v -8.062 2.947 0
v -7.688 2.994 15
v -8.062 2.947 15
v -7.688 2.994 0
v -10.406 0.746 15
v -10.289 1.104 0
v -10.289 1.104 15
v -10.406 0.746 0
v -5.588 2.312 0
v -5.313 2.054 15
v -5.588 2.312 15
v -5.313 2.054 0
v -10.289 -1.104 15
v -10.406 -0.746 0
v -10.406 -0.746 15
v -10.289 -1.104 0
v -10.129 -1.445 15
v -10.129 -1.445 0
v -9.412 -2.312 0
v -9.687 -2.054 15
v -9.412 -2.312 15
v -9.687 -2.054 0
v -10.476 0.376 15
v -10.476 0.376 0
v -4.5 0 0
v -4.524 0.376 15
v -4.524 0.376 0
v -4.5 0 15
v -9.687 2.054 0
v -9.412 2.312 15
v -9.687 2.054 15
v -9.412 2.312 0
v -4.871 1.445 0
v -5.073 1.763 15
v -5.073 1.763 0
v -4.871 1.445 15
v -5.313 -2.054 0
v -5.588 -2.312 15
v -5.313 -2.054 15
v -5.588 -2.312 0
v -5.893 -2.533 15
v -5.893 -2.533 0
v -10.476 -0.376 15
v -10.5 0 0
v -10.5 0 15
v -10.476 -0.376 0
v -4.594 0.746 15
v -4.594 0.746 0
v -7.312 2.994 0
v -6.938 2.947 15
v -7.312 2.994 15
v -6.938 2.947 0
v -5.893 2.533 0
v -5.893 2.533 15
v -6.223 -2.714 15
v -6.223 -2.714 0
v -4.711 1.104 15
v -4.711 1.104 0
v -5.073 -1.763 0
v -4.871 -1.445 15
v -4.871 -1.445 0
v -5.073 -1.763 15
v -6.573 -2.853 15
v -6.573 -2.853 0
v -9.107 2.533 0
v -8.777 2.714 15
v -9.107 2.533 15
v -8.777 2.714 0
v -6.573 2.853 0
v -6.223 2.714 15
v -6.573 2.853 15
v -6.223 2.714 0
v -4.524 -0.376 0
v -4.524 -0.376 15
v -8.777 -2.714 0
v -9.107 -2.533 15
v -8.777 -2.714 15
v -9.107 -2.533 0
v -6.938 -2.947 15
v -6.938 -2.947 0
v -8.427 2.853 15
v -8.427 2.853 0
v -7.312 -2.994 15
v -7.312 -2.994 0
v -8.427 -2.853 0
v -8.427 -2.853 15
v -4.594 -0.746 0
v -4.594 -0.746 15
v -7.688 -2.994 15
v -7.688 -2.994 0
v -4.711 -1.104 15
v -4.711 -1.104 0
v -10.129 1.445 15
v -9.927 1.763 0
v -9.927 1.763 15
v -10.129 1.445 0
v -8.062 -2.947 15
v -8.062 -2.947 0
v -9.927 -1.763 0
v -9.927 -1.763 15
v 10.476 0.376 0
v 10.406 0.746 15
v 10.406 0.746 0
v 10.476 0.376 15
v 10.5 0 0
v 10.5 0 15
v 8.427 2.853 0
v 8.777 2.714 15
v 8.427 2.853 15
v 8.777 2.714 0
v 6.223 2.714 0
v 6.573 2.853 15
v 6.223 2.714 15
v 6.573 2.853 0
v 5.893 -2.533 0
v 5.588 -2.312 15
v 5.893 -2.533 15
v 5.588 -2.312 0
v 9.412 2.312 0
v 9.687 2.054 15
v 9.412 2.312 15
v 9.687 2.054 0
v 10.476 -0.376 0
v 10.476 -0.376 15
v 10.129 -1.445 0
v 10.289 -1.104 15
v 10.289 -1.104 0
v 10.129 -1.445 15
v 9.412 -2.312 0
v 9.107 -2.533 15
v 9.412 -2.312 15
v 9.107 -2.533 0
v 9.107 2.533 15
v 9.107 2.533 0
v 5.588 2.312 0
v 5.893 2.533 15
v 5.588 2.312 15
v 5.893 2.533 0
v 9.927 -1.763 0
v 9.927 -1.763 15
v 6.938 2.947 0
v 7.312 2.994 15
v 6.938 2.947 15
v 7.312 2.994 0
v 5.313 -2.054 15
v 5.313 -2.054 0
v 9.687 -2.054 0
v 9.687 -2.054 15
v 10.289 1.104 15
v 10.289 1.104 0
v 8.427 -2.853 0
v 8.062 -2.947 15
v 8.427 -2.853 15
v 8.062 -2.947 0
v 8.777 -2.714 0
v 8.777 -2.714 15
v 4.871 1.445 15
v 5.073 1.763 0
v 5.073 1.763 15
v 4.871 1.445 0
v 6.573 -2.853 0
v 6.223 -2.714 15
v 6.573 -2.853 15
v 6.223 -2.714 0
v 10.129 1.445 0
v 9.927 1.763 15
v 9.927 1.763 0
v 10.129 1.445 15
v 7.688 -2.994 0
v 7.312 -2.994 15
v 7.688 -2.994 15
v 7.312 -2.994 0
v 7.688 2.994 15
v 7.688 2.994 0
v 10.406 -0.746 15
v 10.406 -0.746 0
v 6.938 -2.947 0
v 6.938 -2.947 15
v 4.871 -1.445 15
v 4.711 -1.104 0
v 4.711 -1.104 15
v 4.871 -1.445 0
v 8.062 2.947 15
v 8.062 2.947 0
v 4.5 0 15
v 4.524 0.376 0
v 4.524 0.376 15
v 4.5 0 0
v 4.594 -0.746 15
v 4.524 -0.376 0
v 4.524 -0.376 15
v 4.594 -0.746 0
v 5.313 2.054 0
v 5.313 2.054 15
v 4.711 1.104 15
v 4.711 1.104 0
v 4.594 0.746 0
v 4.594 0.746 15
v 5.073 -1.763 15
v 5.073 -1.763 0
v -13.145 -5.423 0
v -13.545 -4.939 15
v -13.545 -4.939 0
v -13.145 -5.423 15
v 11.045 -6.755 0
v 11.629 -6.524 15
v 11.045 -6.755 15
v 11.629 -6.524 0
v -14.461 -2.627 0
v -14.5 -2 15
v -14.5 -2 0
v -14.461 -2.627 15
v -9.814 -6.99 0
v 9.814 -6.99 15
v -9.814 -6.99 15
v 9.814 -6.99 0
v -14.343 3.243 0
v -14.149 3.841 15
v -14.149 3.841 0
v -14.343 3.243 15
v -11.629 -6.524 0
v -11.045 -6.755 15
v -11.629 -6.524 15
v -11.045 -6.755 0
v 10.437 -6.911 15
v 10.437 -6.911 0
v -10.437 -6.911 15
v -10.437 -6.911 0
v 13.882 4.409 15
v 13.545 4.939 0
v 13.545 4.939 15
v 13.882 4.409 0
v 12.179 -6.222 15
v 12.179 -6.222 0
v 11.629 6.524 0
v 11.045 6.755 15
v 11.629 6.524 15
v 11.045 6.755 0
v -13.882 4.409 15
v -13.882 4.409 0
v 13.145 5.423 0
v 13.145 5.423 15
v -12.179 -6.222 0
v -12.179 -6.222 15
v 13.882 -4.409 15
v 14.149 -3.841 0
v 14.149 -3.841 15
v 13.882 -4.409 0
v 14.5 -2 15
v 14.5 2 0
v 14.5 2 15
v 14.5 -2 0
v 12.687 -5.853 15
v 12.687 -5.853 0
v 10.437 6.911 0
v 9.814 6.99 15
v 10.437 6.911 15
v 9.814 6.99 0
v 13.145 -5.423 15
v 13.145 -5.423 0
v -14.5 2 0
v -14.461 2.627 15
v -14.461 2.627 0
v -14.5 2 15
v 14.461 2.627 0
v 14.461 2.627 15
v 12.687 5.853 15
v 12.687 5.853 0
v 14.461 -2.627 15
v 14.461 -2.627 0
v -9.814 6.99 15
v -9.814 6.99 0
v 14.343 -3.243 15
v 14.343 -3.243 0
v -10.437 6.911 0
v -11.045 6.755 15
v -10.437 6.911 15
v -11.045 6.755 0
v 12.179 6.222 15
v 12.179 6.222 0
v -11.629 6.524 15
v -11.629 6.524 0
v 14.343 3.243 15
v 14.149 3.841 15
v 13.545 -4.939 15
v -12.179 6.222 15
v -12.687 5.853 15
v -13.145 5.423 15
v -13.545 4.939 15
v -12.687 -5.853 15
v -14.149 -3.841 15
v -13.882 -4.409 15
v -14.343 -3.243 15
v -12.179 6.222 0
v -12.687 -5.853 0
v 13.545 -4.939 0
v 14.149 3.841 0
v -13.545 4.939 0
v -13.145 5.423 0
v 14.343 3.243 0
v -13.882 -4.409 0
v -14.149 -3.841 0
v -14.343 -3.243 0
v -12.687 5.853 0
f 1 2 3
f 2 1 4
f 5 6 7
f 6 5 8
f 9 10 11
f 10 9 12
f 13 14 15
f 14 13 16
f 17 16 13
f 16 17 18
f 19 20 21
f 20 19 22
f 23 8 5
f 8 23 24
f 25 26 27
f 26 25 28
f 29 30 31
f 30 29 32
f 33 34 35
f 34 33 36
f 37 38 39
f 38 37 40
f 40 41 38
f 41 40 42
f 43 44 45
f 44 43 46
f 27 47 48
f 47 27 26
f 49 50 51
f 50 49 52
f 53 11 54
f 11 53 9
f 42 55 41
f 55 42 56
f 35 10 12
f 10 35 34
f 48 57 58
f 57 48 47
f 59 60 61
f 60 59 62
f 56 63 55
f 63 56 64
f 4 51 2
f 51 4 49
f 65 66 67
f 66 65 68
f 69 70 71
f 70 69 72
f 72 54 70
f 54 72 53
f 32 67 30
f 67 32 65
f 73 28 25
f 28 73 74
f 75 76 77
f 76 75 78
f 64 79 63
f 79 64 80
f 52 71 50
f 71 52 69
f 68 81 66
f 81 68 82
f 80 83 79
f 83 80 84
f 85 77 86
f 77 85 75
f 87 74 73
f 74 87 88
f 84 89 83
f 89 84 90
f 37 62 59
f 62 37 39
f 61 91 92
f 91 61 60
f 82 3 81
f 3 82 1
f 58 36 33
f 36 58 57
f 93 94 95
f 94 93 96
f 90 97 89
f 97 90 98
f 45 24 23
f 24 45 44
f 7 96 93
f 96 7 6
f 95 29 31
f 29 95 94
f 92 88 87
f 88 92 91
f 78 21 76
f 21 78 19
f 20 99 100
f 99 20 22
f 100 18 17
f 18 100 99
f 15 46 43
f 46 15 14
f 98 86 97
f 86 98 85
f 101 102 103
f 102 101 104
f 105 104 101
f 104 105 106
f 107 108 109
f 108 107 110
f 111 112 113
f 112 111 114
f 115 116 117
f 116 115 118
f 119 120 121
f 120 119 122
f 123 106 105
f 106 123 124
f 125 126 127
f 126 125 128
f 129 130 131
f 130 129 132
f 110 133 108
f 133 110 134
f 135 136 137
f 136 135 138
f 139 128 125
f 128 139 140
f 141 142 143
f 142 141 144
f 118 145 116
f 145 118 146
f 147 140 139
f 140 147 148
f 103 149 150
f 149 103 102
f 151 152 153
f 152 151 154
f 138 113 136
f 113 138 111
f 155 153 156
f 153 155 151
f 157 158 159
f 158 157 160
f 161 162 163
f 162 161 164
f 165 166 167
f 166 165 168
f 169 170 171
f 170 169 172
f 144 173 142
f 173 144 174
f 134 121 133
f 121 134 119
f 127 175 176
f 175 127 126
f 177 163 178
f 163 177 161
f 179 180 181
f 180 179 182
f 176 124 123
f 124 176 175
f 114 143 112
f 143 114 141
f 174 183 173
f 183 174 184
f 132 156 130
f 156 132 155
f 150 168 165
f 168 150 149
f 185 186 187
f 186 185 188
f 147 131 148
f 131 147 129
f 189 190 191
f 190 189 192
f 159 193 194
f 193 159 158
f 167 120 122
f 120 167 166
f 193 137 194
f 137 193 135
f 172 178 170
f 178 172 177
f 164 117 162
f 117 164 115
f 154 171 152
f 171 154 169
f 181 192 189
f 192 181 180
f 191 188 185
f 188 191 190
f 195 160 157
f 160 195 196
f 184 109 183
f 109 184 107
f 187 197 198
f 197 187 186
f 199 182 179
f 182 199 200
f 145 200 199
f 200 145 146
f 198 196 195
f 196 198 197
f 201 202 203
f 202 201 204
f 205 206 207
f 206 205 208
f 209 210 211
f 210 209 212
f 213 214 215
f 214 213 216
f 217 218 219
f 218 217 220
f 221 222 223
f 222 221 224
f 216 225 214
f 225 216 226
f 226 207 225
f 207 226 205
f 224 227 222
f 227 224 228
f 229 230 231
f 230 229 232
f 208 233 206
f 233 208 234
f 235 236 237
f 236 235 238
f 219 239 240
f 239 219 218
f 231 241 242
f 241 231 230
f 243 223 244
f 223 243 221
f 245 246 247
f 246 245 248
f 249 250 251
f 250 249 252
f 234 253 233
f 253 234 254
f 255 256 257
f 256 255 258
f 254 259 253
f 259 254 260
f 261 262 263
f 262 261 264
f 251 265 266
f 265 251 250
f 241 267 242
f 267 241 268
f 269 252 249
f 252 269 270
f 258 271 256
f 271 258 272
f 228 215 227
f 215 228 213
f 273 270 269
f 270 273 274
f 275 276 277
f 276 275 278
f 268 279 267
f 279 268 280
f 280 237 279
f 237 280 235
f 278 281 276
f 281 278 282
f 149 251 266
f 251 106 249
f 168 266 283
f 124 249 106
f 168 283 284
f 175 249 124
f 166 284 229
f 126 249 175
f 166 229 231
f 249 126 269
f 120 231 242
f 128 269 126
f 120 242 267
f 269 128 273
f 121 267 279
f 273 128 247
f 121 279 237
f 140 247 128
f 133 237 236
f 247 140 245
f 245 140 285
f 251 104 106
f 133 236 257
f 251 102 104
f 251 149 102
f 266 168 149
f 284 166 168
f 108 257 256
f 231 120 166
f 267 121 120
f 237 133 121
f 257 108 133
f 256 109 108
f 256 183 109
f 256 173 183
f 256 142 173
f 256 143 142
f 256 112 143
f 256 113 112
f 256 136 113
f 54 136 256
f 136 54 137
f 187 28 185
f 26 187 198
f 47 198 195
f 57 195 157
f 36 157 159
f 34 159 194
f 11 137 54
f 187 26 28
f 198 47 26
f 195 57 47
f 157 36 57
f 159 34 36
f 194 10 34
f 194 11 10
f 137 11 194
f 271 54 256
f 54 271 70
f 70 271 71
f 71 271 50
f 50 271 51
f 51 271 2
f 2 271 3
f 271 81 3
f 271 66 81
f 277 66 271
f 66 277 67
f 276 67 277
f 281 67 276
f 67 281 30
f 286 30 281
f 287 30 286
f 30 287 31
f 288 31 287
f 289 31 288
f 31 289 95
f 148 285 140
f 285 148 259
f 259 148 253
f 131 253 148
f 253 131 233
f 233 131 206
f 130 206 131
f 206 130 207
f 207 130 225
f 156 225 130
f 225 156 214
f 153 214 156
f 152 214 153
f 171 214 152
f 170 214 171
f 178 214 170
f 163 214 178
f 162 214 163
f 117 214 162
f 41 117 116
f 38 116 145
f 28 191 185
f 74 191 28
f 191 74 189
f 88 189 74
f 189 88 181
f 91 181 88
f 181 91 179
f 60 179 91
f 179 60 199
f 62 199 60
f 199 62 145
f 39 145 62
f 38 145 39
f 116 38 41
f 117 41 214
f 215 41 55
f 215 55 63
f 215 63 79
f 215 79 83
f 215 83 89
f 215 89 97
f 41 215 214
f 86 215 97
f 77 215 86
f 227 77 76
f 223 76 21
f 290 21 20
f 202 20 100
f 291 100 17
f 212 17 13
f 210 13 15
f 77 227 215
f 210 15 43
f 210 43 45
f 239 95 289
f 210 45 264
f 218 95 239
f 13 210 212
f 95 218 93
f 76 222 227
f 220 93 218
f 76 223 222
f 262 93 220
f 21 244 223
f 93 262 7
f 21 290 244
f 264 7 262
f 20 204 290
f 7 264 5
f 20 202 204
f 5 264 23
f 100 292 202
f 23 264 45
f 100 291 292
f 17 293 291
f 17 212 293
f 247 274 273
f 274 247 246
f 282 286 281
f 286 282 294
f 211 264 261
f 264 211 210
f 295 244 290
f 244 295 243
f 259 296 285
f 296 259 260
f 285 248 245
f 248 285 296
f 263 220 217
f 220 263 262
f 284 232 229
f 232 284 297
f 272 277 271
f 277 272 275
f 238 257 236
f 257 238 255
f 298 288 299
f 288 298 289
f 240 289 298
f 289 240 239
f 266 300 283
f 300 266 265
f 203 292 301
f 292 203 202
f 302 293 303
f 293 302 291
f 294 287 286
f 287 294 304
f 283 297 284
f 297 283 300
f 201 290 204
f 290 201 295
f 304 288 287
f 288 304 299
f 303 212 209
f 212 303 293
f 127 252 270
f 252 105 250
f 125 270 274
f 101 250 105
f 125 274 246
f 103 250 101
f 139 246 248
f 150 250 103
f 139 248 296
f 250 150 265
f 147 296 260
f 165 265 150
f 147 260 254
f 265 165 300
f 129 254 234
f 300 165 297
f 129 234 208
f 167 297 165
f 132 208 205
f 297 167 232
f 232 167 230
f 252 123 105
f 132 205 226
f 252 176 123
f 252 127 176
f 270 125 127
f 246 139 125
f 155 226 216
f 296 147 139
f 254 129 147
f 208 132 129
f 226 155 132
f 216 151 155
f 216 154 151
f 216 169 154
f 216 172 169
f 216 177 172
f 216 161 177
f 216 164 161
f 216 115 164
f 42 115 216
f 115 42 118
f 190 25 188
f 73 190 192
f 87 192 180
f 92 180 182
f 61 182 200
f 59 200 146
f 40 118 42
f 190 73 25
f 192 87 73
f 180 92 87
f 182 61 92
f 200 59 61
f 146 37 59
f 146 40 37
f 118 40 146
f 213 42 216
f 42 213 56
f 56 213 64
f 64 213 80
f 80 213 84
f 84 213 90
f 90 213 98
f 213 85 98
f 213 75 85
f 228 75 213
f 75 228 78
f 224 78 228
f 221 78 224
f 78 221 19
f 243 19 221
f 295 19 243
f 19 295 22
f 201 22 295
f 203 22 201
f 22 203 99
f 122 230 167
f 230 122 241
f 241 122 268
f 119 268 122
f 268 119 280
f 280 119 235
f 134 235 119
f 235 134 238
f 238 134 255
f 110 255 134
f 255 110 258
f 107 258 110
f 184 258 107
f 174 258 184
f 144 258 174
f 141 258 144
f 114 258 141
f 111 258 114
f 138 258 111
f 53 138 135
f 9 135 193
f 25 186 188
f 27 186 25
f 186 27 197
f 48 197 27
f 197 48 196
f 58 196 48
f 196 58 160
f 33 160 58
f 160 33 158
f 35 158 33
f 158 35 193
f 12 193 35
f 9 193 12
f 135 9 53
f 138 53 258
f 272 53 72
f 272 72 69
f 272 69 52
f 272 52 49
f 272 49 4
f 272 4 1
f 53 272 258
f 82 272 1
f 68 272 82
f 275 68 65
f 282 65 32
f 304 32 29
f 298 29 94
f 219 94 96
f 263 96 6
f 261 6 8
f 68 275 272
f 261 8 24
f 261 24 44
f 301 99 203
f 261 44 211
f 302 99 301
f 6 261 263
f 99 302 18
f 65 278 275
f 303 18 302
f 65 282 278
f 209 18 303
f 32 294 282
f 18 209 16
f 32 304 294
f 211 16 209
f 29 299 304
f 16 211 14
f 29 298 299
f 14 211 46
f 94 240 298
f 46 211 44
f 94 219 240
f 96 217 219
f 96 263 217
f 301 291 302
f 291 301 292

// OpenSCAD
$fn = 50;


difference() {
	union() {
		hull() {
			translate(v = [-9.5000000000, 2.0000000000, 0]) {
				cylinder(h = 15, r = 5);
			}
			translate(v = [9.5000000000, 2.0000000000, 0]) {
				cylinder(h = 15, r = 5);
			}
			translate(v = [-9.5000000000, -2.0000000000, 0]) {
				cylinder(h = 15, r = 5);
			}
			translate(v = [9.5000000000, -2.0000000000, 0]) {
				cylinder(h = 15, r = 5);
			}
		}
	}
	union() {
		translate(v = [-7.5000000000, 0.0000000000, 0]) {
			translate(v = [0, 0, -100]) {
				cylinder(h = 200, r = 3.0000000000);
			}
		}
		translate(v = [7.5000000000, 0.0000000000, 0]) {
			translate(v = [0, 0, -100]) {
				cylinder(h = 200, r = 3.0000000000);
			}
		}
	}
}
